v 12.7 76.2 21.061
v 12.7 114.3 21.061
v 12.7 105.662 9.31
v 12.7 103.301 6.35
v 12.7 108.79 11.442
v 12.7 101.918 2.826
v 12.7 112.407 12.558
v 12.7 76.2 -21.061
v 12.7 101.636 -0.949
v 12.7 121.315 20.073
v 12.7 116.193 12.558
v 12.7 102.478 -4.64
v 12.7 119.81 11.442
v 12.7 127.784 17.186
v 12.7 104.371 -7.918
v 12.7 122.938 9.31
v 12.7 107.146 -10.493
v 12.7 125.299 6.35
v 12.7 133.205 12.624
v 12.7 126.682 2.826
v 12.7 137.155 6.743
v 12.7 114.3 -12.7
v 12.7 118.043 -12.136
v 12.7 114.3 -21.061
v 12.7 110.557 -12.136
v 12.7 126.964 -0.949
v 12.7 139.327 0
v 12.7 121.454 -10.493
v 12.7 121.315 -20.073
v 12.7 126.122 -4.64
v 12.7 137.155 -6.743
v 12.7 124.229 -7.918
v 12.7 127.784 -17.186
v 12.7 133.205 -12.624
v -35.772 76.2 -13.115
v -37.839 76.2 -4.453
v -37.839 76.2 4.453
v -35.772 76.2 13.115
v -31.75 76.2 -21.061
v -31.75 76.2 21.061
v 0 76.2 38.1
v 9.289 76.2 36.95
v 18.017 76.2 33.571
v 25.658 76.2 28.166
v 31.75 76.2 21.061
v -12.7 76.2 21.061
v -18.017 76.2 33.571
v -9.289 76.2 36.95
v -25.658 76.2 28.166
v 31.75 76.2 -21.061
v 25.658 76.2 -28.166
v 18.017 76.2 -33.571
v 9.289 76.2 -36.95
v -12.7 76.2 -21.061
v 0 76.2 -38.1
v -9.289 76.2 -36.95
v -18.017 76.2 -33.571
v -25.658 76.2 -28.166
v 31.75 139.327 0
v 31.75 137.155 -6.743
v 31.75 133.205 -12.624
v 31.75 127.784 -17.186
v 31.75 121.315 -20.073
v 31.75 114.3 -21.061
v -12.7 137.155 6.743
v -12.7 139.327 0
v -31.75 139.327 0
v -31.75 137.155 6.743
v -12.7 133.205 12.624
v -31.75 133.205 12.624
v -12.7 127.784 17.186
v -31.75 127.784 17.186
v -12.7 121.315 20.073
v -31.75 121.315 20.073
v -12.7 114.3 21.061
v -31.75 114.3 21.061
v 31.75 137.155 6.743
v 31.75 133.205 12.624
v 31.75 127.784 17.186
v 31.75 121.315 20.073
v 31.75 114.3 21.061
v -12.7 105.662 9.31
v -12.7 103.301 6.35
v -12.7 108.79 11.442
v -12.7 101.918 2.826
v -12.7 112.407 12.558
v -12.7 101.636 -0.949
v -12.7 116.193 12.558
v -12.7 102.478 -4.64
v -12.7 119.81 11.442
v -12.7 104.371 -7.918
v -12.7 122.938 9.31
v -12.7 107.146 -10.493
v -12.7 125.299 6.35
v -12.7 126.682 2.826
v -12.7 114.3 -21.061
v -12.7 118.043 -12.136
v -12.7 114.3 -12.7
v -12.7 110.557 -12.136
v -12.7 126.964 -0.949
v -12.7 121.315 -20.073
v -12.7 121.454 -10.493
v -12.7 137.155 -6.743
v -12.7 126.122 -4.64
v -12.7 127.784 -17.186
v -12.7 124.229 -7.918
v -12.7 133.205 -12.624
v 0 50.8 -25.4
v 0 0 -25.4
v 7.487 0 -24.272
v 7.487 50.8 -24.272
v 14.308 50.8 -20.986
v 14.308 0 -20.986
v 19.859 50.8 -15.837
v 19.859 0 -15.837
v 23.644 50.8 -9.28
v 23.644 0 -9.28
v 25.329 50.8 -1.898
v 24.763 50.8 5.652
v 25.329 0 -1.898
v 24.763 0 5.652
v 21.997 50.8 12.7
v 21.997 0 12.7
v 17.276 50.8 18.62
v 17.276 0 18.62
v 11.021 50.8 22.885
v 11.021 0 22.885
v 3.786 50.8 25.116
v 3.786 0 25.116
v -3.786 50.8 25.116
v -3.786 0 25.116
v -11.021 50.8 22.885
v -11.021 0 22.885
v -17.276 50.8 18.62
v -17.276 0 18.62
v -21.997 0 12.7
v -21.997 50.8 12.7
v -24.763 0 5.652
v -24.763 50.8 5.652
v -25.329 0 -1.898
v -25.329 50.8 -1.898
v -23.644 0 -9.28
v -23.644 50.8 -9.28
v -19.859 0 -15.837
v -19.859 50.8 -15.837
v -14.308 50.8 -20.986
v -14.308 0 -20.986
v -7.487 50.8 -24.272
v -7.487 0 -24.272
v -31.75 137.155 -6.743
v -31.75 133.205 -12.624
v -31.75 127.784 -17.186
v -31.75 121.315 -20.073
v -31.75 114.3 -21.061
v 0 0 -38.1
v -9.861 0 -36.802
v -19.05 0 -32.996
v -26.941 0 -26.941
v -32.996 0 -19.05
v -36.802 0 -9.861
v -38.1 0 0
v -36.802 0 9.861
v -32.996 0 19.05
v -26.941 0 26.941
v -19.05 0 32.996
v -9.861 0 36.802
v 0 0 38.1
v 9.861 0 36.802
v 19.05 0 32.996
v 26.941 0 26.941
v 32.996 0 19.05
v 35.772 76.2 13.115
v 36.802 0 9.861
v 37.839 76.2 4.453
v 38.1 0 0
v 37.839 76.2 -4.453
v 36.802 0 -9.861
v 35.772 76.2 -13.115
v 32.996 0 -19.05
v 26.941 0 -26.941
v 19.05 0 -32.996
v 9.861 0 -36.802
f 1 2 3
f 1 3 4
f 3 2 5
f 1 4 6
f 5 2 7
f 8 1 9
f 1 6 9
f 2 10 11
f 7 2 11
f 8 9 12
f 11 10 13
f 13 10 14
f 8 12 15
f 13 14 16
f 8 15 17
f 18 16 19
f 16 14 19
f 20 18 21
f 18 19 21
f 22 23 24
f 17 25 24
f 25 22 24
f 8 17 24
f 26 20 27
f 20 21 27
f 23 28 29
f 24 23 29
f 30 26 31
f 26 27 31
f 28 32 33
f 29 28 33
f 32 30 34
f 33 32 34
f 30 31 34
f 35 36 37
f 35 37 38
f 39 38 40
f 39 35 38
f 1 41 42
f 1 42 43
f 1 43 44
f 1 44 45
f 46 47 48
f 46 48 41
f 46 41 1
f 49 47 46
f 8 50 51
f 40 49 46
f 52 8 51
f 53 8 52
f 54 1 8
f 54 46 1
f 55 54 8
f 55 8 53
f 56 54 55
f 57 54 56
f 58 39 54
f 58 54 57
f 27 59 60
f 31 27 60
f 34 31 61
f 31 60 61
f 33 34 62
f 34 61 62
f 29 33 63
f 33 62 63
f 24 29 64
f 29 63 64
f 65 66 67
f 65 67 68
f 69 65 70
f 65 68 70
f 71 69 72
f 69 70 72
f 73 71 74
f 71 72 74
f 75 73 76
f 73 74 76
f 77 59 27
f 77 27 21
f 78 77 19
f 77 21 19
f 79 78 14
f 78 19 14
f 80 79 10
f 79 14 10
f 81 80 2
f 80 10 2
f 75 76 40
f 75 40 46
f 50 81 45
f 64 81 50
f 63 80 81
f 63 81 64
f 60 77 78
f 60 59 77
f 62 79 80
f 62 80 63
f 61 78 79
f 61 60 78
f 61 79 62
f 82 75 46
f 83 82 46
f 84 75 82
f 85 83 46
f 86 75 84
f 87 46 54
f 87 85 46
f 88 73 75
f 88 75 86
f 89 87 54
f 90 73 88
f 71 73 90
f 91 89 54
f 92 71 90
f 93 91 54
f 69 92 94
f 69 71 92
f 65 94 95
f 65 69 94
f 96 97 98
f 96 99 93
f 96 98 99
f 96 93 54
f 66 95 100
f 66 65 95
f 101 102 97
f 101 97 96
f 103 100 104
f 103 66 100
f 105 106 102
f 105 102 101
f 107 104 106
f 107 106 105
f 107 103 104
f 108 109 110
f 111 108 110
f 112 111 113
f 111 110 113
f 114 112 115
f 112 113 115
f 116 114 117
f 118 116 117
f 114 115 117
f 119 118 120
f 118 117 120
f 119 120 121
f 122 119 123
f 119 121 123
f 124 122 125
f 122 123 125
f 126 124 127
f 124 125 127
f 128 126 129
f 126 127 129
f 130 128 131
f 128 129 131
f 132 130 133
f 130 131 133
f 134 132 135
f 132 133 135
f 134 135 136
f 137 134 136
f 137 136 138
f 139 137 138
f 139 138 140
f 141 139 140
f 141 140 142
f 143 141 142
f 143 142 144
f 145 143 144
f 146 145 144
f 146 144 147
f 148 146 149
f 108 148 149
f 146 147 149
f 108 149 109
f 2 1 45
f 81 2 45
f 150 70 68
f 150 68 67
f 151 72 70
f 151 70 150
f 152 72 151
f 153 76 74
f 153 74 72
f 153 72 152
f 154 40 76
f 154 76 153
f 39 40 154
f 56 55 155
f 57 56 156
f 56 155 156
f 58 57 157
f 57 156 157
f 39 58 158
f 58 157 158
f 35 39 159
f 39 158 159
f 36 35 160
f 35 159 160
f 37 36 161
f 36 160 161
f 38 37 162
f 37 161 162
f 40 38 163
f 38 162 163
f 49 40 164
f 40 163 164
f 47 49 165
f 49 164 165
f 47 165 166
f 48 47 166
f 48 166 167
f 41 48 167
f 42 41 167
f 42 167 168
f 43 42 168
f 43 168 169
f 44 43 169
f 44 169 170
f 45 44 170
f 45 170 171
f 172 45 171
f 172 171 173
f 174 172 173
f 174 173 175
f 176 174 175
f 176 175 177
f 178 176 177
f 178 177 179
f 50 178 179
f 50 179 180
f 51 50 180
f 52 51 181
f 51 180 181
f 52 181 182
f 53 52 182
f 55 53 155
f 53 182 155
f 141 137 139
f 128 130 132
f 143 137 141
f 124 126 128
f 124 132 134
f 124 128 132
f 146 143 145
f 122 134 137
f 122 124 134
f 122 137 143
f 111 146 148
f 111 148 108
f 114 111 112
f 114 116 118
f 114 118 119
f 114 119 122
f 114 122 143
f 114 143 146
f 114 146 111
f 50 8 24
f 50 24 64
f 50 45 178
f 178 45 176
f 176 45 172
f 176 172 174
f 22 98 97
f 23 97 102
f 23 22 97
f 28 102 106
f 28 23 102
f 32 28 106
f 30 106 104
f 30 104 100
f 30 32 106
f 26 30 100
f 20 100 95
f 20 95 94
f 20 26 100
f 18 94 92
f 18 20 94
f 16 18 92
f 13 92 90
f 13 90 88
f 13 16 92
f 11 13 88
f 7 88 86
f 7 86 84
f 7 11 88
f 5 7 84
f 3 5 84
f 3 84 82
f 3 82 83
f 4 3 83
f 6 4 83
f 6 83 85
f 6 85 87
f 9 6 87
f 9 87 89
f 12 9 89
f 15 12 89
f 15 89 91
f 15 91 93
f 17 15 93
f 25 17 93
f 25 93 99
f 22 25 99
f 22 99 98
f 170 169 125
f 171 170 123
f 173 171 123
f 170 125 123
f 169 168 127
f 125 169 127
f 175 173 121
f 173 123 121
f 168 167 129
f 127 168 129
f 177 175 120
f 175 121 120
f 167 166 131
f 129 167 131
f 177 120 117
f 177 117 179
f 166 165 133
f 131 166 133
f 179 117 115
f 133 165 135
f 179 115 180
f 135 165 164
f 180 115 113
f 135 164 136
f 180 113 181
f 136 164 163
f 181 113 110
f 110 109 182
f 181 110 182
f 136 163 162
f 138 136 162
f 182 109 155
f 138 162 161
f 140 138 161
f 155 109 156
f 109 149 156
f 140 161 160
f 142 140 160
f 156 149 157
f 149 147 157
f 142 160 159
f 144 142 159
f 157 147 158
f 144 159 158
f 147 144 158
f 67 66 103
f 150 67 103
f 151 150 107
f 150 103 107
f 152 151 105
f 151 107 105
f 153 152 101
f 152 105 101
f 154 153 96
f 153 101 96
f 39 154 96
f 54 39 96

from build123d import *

# Parameters (mm, degrees)
SKETCH1_R           = 38.1
BOSS_EXTRUDE1_DEPTH = 76.2
SKETCH2_W           = 63.5
SKETCH2_H           = 42.121134838
BOSS_EXTRUDE2_DEPTH = 63.5
SKETCH3_W           = 25.4
SKETCH3_H           = 42.121134838
CUT_EXTRUDE1_DEPTH  = 63.5
FILLET1_R           = 25.4
SKETCH5_R           = 25.4
CUT_EXTRUDE3_DEPTH  = 50.8
SKETCH6_R           = 12.7
BOSS_EXTRUDE3_DEPTH = 53.34


with BuildPart() as part:
    # Sketch1 → Boss-Extrude1 (new body)
    with BuildSketch(Plane(origin=(0, 0, 0), x_dir=(1, 0, 0), z_dir=(0, 1, 0))):
        with Locations(Location((0, 0, 0), (0, 0, 90))):
            Circle(SKETCH1_R)
    extrude(amount=BOSS_EXTRUDE1_DEPTH)

    # Sketch2 → Boss-Extrude2 (add)
    with BuildSketch(Plane(origin=(0, 76.2, 0), x_dir=(1, 0, 0), z_dir=(0, 1, 0))):
        Rectangle(SKETCH2_W, SKETCH2_H)
    extrude(amount=BOSS_EXTRUDE2_DEPTH)

    # Sketch3 → Cut-Extrude1 (cut)
    with BuildSketch(Plane(origin=(0, 139.7, 0), x_dir=(1, 0, 0), z_dir=(0, 1, 0))):
        Rectangle(SKETCH3_W, SKETCH3_H)
    extrude(amount=-CUT_EXTRUDE1_DEPTH, mode=Mode.SUBTRACT)

    # Fillet1
    # the kernel refuses this fillet: 25.4 mm, written as the material it takes off along each edge
    with BuildSketch(Plane(origin=(50.8, 139.7, -21.060567419), x_dir=(0, -1, 0), z_dir=(-1, 0, 0)), Plane(origin=(-95.25, 139.7, 21.060567419), x_dir=(0, -1, 0), z_dir=(1, 0, 0)), Plane(origin=(95.25, 139.7, -21.060567419), x_dir=(0, -1, 0), z_dir=(-1, 0, 0)), Plane(origin=(-50.8, 139.7, 21.060567419), x_dir=(0, -1, 0), z_dir=(1, 0, 0))) as fillet1_piece_1:
        with BuildLine():
            CenterArc((FILLET1_R, FILLET1_R), FILLET1_R, 180, 90)
            Line((0, FILLET1_R), (0, 0))
            Line((0, 0), (FILLET1_R, 0))
        make_face()
    extrude(amount=146.05, mode=Mode.SUBTRACT)

    # Sketch5 → Cut-Extrude3 (cut)
    with BuildSketch(Plane.XZ):
        with Locations(Location((0, 0, 0), (0, 0, 270))):
            Circle(SKETCH5_R)
    extrude(amount=-CUT_EXTRUDE3_DEPTH, mode=Mode.SUBTRACT)

    # Sketch6 → Boss-Extrude3 (add)
    with BuildSketch(Plane(origin=(31.75, 0, 0), x_dir=(0, 0, -1), z_dir=(1, 0, 0))):
        with Locations((0, 114.3)):
            Circle(SKETCH6_R)
    extrude(amount=-BOSS_EXTRUDE3_DEPTH)


solid = part.part
